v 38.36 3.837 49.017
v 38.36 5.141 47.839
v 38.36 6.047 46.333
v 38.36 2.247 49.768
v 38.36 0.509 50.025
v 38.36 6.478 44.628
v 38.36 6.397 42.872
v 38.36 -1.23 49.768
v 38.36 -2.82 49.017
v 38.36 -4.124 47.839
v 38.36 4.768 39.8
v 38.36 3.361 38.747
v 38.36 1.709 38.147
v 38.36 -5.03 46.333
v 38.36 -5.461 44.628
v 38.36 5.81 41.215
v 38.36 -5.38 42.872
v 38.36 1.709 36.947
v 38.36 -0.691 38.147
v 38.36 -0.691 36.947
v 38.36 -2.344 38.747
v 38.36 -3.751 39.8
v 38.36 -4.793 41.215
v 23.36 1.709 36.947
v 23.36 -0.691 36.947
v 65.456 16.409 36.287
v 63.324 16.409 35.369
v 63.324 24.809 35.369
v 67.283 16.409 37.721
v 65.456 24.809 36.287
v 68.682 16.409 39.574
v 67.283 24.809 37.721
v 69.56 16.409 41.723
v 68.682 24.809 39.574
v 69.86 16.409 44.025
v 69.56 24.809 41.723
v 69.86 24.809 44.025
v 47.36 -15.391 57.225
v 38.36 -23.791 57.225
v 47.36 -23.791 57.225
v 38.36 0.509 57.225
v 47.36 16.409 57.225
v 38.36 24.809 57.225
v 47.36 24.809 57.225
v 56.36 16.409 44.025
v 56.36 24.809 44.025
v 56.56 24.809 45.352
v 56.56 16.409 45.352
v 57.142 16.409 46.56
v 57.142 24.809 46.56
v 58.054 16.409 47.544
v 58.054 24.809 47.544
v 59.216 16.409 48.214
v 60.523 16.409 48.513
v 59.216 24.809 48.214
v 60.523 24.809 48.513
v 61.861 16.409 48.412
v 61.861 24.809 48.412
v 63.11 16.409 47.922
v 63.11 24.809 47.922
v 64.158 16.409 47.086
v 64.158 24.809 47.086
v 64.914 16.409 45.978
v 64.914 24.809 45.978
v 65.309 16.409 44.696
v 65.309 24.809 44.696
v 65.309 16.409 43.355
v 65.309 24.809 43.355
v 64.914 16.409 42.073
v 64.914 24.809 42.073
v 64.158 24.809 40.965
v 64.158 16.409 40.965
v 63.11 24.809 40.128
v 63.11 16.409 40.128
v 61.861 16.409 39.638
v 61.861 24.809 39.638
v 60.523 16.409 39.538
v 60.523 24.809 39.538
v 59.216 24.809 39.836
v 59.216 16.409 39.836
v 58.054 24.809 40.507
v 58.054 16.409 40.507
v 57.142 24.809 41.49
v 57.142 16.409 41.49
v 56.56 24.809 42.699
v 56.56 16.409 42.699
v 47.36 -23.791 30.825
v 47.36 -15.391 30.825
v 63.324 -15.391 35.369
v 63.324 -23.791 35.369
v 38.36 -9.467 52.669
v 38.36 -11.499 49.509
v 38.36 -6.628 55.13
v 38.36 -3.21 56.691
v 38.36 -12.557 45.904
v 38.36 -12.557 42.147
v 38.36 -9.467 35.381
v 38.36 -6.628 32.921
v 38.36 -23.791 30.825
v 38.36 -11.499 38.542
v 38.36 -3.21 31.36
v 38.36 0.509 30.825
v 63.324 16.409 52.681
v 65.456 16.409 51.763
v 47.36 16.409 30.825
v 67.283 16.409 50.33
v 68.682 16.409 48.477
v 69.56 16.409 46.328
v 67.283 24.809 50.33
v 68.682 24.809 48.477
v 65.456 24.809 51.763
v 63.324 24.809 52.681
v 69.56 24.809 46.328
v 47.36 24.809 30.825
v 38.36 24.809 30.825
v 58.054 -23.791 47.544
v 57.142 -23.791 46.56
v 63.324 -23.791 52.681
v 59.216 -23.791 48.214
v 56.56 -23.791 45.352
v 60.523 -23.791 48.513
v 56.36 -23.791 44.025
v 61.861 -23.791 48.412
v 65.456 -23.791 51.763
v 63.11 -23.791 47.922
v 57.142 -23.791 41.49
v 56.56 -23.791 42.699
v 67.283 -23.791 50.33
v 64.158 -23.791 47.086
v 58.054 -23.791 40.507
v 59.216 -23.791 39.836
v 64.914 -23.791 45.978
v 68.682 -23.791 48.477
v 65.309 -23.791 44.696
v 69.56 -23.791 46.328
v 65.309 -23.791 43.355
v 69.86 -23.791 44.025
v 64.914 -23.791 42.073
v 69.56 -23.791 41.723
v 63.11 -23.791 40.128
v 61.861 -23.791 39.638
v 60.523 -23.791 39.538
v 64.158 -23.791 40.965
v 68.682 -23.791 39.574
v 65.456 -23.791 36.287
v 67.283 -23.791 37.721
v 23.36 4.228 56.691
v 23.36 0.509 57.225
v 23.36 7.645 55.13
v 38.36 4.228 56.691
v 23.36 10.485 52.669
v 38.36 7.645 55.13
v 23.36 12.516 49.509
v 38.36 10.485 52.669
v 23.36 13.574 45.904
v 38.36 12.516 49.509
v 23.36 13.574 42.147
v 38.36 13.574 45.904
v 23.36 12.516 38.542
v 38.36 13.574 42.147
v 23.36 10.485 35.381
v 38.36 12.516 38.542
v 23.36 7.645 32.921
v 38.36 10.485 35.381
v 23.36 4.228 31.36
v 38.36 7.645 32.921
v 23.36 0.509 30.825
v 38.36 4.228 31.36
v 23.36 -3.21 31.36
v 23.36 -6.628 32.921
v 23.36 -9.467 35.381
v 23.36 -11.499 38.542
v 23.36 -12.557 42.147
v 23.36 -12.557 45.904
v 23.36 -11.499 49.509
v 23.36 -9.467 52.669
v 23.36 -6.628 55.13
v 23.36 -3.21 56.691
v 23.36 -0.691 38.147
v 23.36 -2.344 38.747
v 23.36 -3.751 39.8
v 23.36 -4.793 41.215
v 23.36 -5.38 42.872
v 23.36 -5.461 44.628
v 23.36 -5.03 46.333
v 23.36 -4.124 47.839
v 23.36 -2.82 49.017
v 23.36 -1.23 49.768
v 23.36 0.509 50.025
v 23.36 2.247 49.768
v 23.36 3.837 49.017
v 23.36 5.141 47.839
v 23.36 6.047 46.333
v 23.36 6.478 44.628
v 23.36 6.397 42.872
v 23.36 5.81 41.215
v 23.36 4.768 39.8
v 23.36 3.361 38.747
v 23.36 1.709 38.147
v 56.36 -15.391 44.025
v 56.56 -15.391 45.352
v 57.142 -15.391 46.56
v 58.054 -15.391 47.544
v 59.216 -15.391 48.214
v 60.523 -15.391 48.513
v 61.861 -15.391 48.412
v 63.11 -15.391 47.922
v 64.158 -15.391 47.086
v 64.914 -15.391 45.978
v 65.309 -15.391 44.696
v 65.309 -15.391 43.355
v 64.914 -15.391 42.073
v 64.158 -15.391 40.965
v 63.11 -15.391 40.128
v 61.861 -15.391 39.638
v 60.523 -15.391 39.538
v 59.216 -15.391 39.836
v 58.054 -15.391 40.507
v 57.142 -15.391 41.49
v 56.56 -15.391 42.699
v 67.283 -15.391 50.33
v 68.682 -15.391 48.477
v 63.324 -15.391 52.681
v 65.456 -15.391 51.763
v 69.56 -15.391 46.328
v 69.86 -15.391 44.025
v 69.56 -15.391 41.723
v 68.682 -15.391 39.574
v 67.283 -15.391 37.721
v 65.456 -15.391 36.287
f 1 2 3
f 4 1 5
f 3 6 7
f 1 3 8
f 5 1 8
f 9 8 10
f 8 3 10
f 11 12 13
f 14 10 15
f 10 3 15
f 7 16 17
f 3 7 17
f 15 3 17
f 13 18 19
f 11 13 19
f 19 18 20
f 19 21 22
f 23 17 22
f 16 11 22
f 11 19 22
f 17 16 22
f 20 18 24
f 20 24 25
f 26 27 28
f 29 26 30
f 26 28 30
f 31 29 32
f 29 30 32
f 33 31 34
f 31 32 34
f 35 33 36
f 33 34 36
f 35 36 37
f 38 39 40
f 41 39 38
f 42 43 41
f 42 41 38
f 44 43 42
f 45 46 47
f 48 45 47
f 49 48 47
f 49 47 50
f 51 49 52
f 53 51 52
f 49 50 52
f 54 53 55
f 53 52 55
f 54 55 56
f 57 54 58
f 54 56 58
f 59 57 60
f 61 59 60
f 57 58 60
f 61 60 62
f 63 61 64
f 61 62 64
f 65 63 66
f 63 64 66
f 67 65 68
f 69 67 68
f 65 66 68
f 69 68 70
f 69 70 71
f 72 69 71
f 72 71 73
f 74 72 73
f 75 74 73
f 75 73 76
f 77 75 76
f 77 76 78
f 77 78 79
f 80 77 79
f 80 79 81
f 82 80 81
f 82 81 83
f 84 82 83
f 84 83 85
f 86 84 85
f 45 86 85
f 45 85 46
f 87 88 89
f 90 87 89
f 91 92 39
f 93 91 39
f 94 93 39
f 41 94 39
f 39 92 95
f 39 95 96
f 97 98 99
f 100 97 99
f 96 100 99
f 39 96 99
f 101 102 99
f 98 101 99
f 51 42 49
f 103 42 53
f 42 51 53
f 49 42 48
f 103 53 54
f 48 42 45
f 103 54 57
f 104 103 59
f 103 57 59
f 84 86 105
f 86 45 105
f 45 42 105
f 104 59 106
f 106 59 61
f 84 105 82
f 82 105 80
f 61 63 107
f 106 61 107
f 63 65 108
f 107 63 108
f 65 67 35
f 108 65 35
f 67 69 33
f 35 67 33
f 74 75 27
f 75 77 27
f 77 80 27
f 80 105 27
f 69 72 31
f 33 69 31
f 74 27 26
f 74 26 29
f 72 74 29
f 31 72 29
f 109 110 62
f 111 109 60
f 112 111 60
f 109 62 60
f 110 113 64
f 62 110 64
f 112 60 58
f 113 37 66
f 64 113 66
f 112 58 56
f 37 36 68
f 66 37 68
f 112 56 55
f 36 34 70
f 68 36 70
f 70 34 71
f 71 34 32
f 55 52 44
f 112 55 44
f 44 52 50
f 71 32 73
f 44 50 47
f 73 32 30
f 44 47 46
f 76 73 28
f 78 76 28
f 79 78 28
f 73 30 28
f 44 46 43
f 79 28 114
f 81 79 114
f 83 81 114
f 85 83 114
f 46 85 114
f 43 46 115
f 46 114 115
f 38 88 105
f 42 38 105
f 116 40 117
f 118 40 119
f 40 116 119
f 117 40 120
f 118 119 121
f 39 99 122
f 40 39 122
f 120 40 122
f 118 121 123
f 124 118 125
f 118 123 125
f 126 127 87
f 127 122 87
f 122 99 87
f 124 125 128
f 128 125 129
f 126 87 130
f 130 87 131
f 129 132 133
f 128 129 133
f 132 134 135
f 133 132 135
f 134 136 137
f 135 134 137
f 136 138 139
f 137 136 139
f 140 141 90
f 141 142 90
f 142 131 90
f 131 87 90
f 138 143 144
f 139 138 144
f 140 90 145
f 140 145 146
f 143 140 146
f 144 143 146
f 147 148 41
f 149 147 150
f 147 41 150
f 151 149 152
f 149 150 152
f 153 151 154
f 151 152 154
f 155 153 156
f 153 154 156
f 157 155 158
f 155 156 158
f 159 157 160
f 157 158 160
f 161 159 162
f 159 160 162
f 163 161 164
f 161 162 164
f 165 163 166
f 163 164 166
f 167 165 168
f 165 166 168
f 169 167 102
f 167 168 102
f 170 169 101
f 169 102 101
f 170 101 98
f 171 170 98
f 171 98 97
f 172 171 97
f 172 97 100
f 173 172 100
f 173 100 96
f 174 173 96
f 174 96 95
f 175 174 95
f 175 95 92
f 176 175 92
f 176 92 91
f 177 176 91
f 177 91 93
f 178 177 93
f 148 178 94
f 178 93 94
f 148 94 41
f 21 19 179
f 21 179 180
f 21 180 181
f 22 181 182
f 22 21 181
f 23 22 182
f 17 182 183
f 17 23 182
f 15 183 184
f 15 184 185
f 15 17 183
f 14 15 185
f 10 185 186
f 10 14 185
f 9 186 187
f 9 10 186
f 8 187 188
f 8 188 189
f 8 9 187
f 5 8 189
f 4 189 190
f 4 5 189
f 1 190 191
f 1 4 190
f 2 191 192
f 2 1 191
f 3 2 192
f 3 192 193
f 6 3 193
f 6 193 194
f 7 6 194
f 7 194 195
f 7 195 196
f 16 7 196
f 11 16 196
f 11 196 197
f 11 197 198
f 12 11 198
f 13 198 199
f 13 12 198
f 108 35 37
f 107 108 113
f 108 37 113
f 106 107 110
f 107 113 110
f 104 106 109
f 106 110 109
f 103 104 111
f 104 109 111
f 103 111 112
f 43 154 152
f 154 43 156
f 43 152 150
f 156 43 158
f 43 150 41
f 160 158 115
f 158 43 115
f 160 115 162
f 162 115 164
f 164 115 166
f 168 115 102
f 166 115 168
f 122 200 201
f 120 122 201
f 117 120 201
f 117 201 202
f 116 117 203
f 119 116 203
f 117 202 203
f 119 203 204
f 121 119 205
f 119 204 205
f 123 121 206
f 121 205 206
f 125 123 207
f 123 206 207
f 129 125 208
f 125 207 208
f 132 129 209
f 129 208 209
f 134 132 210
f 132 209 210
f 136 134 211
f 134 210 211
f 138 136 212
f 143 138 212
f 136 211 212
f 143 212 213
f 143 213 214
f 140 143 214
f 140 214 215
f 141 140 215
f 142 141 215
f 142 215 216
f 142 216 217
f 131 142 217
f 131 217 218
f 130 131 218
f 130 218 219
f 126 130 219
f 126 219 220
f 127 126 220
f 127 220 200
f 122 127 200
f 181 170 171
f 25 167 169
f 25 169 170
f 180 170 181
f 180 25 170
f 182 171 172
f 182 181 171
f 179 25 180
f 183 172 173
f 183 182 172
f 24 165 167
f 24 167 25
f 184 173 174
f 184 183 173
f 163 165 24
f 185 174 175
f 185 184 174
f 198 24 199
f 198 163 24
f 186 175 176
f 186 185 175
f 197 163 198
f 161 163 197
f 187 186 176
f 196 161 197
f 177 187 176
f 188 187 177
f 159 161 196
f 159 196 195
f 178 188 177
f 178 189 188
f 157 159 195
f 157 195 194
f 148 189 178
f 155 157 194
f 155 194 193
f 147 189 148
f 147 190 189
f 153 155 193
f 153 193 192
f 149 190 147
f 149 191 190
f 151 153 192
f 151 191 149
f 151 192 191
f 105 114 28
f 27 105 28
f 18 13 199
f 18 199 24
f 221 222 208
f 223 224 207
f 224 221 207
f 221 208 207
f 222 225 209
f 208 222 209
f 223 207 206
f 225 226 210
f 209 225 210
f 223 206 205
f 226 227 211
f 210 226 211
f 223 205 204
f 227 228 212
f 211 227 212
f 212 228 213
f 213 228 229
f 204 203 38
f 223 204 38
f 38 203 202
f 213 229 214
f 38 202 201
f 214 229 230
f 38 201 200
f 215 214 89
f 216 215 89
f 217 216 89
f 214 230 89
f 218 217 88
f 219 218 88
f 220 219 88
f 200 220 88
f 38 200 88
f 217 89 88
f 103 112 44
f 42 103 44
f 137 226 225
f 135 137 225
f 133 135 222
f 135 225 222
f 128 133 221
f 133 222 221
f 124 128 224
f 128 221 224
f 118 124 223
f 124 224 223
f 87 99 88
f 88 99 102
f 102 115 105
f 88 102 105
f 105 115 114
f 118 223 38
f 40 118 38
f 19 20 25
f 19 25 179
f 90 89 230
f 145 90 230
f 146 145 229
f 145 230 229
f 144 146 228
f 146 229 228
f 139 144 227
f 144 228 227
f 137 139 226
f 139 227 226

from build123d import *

# Parameters (mm, degrees)
BOSS_EXTRUDE1_DEPTH = 88
CUT_EXTRUDE1_DEPTH  = 227.934618696
SKETCH3_R           = 15
CUT_EXTRUDE2_DEPTH  = 227.934618696
SKETCH4_R           = 44
BOSS_EXTRUDE3_DEPTH = 50
SCALE1_SCALE        = 0.3


with BuildPart() as part:
    # Sketch1 → Boss-Extrude1 (new body)
    with BuildSketch(Plane.XY):
        Polygon((27.330348609, 81.508634223), (27.330348609, 59.807321306), (27.330348609, -59.807321306), (27.330348609, -80.491365777), (57.330348609, -80.491365777), (132.330348609, -80.491365777), (132.330348609, -52.491365777), (57.330348609, -52.491365777), (57.330348609, 53.508634223), (132.330348609, 53.508634223), (132.330348609, 81.508634223), (57.330348609, 81.508634223), align=None)
    extrude(amount=BOSS_EXTRUDE1_DEPTH)

    # Sketch2 → Cut-Extrude1 (cut, through all)
    with BuildSketch(Plane(origin=(0, 81.508634223, 0), x_dir=(1, 0, 0), z_dir=(0, 1, 0))):
        with BuildLine():
            Line((132.330348609, 0), (57.330348609, 0))
            Line((57.330348609, 0), (110.543103545, -15.146046088))
            ThreePointArc((110.543103545, -15.146046088), (126.271763021, -25.922149576), (132.330348609, -44))
            Line((132.330348609, -44), (132.330348609, 0))
        make_face()
        with BuildLine():
            Line((132.330348609, -88), (132.330348609, -44))
            ThreePointArc((132.330348609, -44), (126.271763021, -62.077850424), (110.543103545, -72.853953912))
            Line((110.543103545, -72.853953912), (57.330348609, -88))
            Line((57.330348609, -88), (132.330348609, -88))
        make_face()
    extrude(amount=-CUT_EXTRUDE1_DEPTH, mode=Mode.SUBTRACT)

    # Sketch3 → Cut-Extrude2 (cut, through all)
    with BuildSketch(Plane(origin=(0, 81.508634223, 0), x_dir=(1, 0, 0), z_dir=(0, 1, 0))):
        with Locations(Location((102.330348609, -44, 0), (0, 0, 180))):
            Circle(SKETCH3_R)
    extrude(amount=-CUT_EXTRUDE2_DEPTH, mode=Mode.SUBTRACT)

    # Sketch4 → Boss-Extrude3 (add)
    with BuildSketch(Plane.ZY.offset(-27.330348609)):
        with Locations((44, 0.508634223)):
            Circle(SKETCH4_R)
        with BuildLine():
            Line((24.404082058, 4.508634223), (20.404082058, 4.508634223))
            Line((20.404082058, 4.508634223), (20.404082058, -3.491365777))
            Line((20.404082058, -3.491365777), (24.404082058, -3.491365777))
            ThreePointArc((24.404082058, -3.491365777), (64, 0.508634223), (24.404082058, 4.508634223))
        make_face(mode=Mode.SUBTRACT)
    extrude(amount=BOSS_EXTRUDE3_DEPTH)


with BuildPart() as part_1:
    # Scale1: scaled about (43.08652806, 0.508634223, 44.036146931)
    add(part.part.scale(SCALE1_SCALE).moved(Location((30.160569642, 0.356043956, 30.825302852))))


solid = part_1.part
